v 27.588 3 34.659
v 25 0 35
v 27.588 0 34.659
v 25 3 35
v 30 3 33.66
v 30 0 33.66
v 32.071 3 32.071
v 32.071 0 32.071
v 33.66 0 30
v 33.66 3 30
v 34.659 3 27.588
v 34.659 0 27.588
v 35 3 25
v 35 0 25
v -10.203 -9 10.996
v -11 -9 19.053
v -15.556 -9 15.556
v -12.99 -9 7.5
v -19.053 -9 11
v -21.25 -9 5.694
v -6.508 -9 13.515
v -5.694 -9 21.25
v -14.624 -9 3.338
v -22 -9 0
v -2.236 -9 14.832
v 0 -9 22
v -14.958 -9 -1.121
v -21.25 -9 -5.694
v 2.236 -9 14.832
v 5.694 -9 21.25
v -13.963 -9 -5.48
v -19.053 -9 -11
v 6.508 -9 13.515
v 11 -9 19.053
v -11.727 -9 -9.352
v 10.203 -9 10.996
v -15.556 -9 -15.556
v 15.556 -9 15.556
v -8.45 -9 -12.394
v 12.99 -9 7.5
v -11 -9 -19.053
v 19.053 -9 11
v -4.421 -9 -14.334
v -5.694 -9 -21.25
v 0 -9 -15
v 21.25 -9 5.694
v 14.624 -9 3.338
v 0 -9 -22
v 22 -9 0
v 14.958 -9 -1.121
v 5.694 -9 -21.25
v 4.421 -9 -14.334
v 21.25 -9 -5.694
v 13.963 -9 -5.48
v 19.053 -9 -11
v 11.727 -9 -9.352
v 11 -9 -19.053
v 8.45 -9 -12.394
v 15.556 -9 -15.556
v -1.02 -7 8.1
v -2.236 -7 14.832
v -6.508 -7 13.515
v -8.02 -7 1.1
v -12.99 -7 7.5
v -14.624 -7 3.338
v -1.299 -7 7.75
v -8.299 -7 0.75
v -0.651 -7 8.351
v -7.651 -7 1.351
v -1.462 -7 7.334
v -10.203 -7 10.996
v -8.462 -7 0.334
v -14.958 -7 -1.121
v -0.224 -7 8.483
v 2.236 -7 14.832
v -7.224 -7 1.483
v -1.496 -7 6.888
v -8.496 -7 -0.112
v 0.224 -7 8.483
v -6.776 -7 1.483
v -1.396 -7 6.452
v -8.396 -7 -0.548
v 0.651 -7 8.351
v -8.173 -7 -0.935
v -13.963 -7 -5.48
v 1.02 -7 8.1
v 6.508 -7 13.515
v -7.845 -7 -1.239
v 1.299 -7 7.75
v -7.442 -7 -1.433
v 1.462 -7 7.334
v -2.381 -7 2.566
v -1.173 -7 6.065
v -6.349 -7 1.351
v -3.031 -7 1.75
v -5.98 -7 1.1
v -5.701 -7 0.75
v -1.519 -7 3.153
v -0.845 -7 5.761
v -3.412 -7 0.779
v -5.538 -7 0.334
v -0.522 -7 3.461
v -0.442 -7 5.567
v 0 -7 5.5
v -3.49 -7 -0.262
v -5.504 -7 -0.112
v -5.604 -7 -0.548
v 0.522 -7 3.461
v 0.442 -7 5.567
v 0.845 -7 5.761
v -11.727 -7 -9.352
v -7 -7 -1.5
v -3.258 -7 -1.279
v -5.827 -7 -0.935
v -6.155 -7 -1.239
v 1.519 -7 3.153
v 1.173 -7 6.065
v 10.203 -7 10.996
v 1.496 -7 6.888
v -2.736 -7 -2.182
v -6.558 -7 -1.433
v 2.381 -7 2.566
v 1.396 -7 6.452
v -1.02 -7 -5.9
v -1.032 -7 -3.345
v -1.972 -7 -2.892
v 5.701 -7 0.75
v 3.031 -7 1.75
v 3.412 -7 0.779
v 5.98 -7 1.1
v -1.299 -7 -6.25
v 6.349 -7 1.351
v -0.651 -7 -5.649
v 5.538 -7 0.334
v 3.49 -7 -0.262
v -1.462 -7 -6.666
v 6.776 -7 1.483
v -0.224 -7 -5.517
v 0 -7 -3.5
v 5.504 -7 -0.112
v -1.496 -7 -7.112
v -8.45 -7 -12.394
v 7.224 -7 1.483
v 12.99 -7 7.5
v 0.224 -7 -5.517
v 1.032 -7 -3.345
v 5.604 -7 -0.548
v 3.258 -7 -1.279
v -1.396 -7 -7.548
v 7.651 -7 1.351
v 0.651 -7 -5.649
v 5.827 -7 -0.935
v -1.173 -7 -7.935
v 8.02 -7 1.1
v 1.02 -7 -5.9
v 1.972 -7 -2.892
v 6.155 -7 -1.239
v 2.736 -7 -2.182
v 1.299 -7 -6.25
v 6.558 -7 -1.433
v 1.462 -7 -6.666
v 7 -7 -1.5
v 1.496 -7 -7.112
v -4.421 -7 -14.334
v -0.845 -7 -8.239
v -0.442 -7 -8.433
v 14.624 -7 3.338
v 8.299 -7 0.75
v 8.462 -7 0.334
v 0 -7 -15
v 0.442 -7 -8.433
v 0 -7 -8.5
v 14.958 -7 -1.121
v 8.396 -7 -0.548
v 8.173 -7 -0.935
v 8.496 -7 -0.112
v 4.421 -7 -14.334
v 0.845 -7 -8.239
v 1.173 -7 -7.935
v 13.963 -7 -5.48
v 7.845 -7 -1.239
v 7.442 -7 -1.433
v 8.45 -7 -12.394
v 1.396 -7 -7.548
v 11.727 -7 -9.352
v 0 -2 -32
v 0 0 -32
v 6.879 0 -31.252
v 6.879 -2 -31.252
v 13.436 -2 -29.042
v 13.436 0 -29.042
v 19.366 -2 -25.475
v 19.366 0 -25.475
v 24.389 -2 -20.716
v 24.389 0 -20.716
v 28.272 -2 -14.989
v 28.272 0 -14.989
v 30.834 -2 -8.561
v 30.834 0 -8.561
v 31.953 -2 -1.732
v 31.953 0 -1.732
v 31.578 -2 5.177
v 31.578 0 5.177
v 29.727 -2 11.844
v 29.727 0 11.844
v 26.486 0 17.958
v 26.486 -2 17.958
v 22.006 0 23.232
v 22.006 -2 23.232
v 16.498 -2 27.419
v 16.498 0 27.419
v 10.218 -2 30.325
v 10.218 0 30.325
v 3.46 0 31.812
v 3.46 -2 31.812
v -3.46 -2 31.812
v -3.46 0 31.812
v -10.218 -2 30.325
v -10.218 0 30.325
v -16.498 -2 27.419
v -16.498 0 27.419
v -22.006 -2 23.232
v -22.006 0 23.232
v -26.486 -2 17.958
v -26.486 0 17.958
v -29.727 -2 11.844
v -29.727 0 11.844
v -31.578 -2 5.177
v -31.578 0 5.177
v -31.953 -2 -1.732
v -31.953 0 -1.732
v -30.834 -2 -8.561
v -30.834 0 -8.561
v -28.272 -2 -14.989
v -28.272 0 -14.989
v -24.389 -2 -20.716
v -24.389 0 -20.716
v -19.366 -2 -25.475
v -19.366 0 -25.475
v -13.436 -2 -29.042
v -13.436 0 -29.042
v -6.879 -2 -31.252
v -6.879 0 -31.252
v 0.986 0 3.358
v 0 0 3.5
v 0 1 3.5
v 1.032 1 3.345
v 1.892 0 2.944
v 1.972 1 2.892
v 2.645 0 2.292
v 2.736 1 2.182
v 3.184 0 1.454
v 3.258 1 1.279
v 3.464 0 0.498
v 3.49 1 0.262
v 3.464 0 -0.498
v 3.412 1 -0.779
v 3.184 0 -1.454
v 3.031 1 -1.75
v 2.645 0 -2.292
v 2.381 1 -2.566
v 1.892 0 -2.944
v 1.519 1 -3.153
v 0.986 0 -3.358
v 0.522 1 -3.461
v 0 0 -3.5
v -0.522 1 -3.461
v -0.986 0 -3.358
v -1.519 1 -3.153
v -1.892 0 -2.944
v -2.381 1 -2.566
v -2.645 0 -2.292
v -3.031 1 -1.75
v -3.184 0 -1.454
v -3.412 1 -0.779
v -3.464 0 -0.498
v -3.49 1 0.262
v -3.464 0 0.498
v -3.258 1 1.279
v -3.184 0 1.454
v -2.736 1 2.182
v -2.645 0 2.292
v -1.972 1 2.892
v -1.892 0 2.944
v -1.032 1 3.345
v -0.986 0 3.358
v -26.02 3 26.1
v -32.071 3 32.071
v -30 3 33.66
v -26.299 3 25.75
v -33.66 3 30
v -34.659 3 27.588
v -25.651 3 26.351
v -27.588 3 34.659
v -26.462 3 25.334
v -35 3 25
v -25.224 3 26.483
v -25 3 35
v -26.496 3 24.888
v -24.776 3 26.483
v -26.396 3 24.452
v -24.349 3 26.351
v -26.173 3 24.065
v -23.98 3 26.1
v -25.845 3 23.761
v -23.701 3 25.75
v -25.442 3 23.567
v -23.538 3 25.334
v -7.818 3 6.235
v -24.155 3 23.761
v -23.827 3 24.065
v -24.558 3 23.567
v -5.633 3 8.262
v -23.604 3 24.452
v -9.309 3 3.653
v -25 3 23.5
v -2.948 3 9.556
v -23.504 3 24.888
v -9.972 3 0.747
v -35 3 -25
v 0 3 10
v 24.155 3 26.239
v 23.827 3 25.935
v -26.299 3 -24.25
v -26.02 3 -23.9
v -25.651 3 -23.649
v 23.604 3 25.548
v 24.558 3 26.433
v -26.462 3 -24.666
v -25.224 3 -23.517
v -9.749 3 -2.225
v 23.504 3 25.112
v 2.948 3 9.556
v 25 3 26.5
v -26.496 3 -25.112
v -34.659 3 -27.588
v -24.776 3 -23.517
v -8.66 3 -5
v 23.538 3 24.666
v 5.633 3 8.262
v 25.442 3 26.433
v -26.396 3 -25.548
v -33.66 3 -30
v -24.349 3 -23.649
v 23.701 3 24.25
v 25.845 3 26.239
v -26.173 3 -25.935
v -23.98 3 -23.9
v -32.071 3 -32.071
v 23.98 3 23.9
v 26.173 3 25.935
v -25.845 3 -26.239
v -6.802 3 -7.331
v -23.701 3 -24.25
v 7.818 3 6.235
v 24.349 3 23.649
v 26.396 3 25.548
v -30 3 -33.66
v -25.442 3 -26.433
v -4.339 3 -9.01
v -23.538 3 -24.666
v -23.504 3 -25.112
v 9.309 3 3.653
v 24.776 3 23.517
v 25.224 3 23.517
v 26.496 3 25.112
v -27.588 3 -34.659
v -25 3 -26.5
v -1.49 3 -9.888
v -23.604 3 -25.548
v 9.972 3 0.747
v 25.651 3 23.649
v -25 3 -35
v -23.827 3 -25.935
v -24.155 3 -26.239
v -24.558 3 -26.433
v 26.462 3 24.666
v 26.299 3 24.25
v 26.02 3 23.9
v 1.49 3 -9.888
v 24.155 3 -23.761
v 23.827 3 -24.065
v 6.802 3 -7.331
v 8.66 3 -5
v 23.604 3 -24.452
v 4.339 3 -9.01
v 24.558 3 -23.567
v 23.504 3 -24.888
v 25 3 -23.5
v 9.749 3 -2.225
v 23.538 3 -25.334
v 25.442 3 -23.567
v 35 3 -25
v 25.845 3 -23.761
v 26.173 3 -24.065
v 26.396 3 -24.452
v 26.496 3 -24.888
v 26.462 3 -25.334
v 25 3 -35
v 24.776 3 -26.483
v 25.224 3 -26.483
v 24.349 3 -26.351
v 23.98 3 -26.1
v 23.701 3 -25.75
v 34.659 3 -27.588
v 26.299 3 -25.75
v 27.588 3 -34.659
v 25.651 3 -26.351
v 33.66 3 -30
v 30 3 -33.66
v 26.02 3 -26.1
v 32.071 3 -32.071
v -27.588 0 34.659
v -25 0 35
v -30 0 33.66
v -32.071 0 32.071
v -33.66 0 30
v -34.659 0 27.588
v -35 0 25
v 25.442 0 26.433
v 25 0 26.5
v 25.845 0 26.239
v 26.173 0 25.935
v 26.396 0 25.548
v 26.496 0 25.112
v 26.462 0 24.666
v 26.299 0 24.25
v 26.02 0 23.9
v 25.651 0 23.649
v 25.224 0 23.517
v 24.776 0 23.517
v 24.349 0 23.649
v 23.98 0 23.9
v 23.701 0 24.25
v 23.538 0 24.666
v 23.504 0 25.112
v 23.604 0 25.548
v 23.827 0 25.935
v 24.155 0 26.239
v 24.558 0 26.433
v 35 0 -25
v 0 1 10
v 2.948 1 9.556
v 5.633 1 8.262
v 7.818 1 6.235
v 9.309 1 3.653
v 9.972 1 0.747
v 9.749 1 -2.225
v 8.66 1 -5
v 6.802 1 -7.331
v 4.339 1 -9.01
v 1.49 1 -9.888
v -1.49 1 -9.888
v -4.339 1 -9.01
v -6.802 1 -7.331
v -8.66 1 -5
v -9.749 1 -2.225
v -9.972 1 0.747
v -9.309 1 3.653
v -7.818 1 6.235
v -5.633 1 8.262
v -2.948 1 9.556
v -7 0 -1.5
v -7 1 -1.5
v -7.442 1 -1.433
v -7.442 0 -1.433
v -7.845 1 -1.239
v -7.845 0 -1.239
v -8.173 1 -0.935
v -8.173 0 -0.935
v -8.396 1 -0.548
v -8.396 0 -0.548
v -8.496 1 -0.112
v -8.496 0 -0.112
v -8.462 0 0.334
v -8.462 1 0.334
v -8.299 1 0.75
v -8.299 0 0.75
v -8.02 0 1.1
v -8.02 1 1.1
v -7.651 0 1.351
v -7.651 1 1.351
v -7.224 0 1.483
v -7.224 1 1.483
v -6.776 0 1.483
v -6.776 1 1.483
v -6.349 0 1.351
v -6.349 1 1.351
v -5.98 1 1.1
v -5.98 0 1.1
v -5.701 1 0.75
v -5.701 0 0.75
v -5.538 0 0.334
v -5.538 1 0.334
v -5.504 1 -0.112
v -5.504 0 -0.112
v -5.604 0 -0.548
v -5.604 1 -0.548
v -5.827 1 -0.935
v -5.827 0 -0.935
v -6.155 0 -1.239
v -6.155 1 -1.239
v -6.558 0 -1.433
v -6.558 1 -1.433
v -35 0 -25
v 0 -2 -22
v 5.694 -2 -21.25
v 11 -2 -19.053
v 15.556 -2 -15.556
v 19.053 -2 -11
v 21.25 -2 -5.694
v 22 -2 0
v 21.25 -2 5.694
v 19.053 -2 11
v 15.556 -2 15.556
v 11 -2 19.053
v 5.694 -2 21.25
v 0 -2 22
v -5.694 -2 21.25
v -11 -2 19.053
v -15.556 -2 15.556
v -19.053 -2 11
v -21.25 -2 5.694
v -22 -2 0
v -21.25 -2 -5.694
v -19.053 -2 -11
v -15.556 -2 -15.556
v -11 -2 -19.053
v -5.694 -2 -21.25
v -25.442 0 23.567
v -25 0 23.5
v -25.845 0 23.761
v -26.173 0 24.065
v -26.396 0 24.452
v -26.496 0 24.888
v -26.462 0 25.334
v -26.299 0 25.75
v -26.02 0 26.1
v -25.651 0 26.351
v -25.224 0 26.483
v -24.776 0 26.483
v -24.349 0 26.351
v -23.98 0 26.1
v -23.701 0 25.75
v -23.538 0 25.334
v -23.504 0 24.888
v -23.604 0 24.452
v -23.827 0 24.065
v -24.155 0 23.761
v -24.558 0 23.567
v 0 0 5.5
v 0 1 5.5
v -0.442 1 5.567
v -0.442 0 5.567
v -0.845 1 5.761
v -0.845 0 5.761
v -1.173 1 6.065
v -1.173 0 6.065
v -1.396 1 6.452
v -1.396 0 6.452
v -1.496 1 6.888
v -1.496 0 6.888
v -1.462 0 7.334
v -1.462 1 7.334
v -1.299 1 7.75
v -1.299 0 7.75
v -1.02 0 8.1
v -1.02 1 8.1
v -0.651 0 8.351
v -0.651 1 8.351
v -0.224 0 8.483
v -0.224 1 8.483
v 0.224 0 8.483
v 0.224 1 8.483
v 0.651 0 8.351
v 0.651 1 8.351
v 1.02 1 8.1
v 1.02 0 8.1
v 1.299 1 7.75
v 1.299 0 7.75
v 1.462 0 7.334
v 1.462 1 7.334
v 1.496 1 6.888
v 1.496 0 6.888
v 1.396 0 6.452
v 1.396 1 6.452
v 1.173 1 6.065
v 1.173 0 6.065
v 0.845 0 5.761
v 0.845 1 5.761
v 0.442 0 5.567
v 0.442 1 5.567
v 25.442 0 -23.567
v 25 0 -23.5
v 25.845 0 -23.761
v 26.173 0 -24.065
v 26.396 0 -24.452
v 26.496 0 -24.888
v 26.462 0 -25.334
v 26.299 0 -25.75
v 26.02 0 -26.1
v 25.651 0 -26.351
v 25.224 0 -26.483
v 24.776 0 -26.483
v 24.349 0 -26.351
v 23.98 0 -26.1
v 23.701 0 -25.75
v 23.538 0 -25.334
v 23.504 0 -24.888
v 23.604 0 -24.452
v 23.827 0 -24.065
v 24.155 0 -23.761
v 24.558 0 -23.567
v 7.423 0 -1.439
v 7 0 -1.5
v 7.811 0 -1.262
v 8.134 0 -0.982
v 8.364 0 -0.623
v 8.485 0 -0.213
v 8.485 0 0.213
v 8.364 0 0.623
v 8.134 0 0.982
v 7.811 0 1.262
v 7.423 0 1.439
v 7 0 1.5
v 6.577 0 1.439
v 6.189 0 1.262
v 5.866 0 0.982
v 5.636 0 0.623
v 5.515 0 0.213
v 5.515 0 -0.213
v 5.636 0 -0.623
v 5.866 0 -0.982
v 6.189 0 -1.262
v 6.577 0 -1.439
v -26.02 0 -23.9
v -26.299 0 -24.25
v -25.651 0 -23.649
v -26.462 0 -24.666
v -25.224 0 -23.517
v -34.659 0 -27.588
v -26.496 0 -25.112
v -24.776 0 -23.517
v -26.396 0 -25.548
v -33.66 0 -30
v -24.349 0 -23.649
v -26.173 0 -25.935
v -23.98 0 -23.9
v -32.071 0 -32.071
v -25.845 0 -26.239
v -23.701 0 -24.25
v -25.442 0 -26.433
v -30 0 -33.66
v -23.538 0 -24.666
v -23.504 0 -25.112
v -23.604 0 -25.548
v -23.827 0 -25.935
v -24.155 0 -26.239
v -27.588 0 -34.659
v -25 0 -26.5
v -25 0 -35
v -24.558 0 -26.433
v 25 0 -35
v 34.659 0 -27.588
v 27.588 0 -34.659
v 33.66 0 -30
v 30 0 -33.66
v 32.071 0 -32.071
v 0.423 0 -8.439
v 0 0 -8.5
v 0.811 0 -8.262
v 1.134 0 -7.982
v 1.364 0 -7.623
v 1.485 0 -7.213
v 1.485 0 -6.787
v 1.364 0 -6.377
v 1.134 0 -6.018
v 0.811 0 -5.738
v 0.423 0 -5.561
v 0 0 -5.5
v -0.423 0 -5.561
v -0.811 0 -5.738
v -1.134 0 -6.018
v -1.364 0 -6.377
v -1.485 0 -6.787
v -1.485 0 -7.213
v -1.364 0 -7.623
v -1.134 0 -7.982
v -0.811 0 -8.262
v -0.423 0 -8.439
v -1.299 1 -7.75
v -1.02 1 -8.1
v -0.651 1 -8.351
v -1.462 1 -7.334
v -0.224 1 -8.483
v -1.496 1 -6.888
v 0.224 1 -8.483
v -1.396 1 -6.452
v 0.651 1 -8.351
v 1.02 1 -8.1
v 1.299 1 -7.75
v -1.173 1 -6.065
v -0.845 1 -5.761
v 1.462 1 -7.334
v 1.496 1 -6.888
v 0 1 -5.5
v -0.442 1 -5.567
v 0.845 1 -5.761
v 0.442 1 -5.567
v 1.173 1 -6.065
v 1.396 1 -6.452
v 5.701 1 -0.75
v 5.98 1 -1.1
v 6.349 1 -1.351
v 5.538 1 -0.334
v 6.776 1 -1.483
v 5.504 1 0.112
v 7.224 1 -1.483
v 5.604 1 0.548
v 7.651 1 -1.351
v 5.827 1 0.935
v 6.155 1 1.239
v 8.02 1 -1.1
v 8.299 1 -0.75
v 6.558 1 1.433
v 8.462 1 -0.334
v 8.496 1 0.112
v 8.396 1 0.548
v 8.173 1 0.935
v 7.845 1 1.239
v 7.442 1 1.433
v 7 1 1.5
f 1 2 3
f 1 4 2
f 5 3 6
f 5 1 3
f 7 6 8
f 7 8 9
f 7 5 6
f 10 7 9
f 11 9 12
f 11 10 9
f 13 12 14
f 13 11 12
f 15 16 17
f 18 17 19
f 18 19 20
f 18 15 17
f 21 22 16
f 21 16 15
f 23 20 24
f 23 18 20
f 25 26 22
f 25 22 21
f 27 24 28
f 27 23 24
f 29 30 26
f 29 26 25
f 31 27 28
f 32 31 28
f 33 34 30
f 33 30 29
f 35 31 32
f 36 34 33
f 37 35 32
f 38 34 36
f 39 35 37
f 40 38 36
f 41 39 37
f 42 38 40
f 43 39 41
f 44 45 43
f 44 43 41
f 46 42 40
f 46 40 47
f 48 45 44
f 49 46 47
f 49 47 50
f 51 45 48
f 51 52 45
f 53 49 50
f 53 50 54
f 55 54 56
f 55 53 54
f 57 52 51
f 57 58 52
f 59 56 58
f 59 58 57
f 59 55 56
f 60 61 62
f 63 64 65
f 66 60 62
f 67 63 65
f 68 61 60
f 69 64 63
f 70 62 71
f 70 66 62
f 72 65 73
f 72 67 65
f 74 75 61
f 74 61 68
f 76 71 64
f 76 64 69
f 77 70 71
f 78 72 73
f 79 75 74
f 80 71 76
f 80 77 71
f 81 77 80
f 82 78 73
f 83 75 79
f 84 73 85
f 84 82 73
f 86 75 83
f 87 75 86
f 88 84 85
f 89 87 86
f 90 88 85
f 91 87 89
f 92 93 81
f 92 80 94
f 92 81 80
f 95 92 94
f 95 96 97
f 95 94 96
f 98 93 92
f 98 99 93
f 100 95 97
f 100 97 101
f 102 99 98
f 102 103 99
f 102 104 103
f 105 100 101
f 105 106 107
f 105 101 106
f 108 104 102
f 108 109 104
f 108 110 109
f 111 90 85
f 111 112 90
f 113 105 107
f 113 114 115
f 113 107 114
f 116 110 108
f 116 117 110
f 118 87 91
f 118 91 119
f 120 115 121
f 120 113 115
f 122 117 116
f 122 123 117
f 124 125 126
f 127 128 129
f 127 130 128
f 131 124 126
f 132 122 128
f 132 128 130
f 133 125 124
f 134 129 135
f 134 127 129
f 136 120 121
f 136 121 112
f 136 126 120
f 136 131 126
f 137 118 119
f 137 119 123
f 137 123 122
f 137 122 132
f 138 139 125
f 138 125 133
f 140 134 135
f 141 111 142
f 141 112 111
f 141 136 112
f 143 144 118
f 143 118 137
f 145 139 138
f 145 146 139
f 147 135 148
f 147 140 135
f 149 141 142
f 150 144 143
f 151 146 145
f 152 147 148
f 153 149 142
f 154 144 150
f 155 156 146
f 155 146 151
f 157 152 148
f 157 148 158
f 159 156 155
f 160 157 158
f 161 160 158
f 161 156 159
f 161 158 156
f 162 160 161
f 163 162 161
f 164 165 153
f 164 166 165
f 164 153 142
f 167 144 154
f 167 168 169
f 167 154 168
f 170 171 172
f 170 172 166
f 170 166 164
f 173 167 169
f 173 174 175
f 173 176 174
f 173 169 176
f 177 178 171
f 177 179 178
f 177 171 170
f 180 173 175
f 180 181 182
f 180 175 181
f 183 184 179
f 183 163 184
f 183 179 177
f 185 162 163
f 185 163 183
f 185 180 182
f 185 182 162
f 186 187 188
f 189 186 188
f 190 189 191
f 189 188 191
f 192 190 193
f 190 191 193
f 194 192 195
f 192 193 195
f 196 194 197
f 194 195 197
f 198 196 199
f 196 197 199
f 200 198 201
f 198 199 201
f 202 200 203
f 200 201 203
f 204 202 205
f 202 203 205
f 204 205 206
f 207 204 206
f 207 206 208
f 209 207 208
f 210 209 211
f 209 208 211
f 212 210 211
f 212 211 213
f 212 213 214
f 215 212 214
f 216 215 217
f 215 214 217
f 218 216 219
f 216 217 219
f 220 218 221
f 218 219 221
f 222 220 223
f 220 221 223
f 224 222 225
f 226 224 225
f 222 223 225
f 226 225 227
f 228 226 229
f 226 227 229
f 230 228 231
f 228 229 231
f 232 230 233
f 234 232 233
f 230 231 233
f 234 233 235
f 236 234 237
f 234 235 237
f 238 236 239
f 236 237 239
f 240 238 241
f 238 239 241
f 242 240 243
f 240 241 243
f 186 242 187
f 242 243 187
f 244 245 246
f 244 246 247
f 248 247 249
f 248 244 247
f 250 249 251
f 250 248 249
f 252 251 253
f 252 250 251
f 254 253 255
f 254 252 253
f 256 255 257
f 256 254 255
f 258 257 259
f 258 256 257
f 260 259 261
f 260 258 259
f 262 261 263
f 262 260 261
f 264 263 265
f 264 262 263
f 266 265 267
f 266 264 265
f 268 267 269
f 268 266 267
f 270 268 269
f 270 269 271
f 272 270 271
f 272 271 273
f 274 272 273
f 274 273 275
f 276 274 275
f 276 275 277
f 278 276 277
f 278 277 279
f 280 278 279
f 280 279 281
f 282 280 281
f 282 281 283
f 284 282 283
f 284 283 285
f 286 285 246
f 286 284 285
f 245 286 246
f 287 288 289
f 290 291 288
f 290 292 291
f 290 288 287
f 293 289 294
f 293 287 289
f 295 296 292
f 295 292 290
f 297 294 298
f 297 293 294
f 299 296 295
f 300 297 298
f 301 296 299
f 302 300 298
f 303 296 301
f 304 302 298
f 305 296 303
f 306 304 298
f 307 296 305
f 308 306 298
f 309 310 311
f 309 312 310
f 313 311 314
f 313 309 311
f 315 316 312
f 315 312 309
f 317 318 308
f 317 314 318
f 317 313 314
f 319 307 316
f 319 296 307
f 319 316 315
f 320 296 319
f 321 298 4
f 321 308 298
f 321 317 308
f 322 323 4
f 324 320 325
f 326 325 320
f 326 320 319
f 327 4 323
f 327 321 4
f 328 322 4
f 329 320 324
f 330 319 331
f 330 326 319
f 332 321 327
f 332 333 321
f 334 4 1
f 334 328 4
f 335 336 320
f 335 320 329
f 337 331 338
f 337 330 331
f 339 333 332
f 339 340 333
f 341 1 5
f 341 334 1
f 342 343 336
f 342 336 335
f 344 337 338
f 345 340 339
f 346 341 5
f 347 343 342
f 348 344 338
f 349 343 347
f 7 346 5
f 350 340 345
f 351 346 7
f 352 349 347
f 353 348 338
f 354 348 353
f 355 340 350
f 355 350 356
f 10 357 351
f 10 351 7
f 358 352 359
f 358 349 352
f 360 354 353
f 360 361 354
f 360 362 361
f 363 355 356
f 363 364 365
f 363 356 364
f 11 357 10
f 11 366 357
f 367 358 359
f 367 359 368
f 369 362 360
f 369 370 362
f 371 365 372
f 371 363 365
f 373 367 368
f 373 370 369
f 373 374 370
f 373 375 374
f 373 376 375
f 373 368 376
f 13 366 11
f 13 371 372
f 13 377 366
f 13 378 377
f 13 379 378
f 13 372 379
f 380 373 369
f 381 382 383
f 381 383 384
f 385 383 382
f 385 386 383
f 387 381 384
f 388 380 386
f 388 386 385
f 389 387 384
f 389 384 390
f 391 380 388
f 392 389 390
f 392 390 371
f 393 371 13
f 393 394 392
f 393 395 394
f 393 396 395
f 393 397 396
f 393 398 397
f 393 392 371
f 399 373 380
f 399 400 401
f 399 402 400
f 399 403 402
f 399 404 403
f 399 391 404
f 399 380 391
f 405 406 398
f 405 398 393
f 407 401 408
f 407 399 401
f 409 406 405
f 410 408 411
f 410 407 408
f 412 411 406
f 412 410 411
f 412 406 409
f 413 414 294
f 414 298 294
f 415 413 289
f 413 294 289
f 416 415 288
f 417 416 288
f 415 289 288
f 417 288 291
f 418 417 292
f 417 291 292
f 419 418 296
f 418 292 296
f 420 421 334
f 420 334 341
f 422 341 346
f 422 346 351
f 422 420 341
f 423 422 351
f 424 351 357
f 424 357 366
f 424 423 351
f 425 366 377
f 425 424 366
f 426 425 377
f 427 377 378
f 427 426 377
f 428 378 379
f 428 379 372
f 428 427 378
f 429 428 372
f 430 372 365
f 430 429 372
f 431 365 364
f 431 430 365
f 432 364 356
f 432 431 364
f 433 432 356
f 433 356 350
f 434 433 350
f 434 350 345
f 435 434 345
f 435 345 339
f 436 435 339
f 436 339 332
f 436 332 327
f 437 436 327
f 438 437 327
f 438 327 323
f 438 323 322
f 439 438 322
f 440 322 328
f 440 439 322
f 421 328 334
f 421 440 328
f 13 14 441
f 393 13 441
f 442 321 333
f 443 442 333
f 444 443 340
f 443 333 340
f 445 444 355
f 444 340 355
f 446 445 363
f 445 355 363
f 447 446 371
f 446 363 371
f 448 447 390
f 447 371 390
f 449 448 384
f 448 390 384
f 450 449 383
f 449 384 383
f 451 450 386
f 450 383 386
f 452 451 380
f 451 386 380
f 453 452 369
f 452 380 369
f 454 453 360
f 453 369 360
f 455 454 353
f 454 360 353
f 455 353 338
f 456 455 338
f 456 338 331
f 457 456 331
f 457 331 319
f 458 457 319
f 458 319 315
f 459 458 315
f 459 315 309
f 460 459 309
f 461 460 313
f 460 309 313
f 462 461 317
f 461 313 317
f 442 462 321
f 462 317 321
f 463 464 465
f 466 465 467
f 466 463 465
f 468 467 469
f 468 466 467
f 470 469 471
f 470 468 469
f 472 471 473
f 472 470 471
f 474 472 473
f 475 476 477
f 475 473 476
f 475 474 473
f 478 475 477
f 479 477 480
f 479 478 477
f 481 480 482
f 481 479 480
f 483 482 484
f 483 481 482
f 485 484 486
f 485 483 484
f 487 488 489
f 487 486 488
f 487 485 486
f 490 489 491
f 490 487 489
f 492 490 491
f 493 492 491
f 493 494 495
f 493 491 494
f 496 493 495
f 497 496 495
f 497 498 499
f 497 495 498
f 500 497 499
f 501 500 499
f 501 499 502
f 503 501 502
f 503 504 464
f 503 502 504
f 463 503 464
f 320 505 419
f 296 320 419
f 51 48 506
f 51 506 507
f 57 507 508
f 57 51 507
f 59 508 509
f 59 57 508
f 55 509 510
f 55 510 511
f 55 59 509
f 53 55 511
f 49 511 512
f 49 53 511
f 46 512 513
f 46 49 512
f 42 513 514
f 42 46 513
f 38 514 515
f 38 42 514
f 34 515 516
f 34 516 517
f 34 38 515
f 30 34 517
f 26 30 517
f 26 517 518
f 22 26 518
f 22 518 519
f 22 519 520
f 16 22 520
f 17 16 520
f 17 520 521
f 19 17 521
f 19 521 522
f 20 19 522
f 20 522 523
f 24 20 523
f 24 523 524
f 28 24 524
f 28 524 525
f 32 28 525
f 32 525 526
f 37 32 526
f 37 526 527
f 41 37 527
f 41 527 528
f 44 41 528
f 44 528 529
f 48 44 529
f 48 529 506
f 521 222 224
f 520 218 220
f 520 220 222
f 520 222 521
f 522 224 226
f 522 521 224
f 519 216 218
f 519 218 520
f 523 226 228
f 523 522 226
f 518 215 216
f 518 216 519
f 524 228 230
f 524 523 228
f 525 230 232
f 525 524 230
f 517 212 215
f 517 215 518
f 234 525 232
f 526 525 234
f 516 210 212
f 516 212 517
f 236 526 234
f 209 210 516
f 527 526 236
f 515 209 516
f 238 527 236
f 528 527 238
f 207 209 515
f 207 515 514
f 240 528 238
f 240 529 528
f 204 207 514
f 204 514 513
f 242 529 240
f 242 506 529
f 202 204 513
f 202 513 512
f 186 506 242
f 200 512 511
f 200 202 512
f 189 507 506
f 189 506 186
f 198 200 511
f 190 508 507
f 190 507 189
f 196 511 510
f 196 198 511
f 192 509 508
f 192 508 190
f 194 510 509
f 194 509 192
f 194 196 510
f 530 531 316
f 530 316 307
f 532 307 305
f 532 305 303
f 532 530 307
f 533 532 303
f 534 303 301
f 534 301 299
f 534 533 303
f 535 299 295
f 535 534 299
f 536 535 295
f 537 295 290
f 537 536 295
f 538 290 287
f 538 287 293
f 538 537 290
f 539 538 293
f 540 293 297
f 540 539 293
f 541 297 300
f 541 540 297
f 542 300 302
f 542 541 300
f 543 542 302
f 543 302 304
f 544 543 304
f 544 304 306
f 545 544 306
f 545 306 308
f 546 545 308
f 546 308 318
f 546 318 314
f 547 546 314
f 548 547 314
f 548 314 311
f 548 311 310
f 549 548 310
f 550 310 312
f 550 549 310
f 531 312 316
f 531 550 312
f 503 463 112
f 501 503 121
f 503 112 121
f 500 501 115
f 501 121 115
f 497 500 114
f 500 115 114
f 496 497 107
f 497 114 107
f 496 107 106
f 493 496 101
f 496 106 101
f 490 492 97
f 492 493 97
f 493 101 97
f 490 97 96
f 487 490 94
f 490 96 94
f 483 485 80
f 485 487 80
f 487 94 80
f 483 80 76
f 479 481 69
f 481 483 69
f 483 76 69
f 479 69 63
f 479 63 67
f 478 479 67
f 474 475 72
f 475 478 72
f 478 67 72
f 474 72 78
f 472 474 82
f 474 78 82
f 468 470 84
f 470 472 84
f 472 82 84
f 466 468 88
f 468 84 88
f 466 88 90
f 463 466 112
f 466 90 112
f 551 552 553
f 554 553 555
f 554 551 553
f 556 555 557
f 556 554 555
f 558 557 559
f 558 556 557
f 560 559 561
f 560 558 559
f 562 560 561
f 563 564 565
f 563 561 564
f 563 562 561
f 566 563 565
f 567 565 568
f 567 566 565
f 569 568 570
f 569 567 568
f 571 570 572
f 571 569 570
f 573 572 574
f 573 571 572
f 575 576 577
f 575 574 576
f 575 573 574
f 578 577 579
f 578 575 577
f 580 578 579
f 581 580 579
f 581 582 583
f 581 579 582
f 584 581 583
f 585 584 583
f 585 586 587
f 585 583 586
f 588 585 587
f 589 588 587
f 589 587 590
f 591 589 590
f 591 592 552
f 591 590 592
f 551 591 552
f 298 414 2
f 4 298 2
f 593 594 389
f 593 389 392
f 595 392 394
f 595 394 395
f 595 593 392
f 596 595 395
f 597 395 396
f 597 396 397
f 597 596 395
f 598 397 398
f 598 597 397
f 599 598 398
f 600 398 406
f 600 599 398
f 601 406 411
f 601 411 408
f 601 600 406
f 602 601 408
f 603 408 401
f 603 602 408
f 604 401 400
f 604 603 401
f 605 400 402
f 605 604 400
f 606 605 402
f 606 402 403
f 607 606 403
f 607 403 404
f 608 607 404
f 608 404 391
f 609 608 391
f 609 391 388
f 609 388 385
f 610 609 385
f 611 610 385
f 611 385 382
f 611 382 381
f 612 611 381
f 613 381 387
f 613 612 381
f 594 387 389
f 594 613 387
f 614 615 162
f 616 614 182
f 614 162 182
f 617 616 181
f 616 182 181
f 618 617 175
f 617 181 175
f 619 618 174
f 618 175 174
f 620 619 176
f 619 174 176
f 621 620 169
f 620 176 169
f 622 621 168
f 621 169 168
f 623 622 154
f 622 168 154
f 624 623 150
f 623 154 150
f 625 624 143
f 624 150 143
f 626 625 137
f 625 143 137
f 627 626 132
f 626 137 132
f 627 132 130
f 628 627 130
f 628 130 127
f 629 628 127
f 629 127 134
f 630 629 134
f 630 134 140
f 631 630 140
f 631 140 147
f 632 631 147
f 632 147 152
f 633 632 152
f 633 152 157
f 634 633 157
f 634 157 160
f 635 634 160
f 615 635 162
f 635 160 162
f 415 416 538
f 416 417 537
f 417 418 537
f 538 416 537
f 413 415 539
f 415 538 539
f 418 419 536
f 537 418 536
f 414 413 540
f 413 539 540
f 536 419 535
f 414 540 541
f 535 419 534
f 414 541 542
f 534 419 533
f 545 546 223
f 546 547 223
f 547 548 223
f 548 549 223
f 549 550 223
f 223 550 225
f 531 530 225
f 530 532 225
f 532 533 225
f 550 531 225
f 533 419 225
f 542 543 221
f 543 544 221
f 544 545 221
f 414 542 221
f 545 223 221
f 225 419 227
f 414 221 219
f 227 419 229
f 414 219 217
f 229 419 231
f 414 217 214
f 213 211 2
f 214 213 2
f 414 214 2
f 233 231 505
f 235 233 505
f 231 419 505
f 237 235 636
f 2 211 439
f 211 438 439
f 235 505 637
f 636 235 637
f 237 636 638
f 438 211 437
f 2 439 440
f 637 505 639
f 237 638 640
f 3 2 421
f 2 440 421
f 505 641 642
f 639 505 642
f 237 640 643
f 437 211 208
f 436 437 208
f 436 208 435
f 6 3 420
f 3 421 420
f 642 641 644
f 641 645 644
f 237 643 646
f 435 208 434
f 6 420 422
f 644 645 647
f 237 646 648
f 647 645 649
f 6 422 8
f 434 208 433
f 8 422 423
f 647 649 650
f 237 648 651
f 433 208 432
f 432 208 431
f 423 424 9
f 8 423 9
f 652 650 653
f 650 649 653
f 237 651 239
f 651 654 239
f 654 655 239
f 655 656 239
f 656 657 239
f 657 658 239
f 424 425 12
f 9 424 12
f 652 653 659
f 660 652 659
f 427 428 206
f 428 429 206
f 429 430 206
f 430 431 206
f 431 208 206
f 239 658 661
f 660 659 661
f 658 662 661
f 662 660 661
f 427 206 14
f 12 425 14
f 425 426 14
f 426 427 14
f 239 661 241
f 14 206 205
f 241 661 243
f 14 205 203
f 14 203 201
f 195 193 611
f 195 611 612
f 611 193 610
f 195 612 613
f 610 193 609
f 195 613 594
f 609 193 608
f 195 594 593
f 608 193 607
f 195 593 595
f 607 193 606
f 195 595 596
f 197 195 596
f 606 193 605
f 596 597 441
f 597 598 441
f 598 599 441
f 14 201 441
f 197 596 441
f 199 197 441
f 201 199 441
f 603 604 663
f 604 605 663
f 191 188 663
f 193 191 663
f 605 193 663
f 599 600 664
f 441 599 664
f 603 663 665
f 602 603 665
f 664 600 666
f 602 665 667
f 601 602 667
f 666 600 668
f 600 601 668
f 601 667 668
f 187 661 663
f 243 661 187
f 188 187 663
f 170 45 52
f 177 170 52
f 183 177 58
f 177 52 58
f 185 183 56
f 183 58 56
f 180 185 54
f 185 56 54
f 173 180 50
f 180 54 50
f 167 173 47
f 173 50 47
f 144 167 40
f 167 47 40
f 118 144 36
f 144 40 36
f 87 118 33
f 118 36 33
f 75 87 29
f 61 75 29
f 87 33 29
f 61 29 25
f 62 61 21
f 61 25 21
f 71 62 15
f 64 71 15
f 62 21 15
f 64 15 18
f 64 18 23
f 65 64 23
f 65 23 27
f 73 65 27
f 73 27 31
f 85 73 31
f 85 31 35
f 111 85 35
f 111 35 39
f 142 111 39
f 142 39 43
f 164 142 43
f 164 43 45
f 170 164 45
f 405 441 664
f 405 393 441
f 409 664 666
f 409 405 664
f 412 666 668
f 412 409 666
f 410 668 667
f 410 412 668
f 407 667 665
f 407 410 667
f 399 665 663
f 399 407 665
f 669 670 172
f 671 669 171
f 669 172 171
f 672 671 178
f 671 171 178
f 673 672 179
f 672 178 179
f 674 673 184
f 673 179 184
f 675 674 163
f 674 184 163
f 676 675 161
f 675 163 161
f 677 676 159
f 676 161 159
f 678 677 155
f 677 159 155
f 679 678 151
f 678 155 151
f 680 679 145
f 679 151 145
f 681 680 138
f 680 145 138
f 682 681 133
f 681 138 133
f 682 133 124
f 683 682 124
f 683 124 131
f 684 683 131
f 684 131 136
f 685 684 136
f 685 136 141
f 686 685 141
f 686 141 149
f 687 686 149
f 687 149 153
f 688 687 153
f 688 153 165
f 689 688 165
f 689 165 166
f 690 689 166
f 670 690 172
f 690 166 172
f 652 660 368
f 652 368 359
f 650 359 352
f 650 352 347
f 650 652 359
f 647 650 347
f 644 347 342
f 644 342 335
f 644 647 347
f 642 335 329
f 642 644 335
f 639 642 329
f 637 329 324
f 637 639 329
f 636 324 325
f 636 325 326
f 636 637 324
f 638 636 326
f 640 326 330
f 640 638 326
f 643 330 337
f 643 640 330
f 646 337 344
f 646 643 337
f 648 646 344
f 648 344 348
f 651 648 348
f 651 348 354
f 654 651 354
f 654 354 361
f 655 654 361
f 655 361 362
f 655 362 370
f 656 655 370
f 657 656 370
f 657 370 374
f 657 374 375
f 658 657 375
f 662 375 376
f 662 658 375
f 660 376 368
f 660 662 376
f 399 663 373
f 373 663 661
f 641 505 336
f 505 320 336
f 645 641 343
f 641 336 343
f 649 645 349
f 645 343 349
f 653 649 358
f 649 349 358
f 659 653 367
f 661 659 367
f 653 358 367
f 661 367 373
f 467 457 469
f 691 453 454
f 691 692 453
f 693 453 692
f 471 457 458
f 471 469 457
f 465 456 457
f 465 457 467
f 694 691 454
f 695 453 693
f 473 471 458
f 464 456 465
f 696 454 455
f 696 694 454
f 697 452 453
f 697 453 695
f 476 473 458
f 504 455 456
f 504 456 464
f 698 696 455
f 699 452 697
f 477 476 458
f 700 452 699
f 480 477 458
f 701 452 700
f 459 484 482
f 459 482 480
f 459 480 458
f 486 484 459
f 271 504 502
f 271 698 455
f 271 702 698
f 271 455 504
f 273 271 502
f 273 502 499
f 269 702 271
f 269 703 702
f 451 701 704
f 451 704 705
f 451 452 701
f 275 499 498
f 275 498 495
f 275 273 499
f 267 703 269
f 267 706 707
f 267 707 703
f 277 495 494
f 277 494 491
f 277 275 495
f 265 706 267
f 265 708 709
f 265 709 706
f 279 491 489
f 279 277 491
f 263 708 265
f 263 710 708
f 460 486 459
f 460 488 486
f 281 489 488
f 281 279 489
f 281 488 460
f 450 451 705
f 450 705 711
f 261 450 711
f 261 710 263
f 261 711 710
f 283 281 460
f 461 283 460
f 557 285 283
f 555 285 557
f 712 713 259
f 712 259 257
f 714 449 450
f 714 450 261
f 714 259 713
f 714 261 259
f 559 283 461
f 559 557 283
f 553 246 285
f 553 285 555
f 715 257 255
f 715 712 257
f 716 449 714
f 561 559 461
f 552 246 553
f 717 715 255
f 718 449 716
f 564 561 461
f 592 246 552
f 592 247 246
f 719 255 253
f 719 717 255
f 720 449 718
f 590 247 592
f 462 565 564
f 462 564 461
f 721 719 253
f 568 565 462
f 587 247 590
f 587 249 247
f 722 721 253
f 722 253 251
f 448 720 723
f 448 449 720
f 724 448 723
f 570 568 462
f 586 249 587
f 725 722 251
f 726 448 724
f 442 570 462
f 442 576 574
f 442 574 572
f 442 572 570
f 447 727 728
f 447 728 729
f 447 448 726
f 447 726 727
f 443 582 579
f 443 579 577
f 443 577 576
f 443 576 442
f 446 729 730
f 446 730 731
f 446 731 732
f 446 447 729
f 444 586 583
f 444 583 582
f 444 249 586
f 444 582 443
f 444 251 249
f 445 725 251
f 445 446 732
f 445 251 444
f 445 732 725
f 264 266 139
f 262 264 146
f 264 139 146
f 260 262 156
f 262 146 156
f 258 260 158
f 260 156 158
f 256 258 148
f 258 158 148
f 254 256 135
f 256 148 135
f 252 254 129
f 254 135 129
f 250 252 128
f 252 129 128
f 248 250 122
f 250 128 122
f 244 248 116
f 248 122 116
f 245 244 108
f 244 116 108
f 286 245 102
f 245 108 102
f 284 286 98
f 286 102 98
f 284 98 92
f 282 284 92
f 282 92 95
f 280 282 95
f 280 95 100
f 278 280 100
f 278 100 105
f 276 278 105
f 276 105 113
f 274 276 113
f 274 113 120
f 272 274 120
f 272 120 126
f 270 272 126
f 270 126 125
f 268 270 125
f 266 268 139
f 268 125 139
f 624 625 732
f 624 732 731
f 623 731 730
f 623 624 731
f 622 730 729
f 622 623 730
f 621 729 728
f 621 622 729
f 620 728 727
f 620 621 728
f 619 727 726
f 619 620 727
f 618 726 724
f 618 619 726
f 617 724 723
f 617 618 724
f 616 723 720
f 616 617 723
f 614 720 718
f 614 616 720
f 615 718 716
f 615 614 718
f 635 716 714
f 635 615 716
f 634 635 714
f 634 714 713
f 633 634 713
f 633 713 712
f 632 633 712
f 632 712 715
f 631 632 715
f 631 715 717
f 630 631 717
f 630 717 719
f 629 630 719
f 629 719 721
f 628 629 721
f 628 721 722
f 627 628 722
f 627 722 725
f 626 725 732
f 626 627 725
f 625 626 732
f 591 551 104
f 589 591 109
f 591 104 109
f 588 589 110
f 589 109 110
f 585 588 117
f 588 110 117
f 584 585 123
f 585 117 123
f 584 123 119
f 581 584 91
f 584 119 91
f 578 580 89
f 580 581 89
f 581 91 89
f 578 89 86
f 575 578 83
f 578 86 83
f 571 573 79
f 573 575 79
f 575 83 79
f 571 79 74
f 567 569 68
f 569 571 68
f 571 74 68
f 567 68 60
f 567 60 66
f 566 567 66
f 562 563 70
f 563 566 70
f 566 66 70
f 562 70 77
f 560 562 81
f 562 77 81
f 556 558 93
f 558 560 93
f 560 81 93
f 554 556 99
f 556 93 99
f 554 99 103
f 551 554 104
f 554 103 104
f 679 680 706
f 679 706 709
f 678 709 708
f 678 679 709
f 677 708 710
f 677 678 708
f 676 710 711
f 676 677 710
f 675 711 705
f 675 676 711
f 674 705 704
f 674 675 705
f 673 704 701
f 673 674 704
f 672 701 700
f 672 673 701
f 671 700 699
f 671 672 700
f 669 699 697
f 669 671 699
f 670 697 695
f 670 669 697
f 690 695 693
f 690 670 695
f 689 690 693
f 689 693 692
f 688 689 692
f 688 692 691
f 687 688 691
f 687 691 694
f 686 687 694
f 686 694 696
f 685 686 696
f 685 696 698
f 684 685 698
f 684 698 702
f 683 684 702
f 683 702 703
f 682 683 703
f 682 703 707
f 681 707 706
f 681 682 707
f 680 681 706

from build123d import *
from build123d.topology import SkipClean

# Parameters (mm, degrees)
SKETCH_1_R          = 1.5000000000000002
SKETCH_1_R_2        = 1.5000000000000007
SKETCH_1_R_3        = 3.5000000000000036
SKETCH_1_R_4        = 1.5000000000000004
SKETCH_1_R_5        = 1.5000000000000009
EXTRUDE_1_DEPTH     = 3
EXTRUDE_START       = 7
SKETCH_2_R          = 15.00000000000001
SKETCH_2_R_2        = 1.5000000000000002
SKETCH_2_R_3        = 3.5000000000000036
SKETCH_2_R_4        = 1.5000000000000009
SKETCH_2_R_5        = 1.5000000000000007
EXTRUDE_2_DEPTH     = 7
EXTRUDE_START_2     = 9
SKETCH_6_R          = 22
SKETCH_6_R_2        = 15
EXTRUDE_3_DEPTH     = 9
SKETCH_8_R          = 32
SKETCH_8_R_2        = 12.000000000000002
EXTRUDE_5_DEPTH     = 2
FILLET_1_R          = 10
SKETCH_11_R         = 10
CUT_EXTRUDE_1_DEPTH = 2


with BuildPart() as part:
    # 草图1 → 凸台-拉伸1 (new body)
    with BuildSketch(Plane(origin=(0, 0, 0), x_dir=(1, 0, 0), z_dir=(0, 1, 0))):
        Polygon((-35.00000000000001, -35), (34.99999999999999, -35), (34.99999999999999, 34.99999999999999), (-35.00000000000001, 35), align=None)
        with Locations(Location((4.3e-16, 6.999999999999999, 0), (0, 0, 270))):
            Circle(SKETCH_1_R, mode=Mode.SUBTRACT)
        with Locations(Location((6.999999999999999, -4.3e-16, 0), (0, 0, 270))):
            Circle(SKETCH_1_R_2, mode=Mode.SUBTRACT)
        with Locations(Location((-4.21e-15, 2.73e-15, 0), (0, 0, 270))):
            Circle(SKETCH_1_R_3, mode=Mode.SUBTRACT)
        with Locations(Location((-9.8e-16, -6.999999999999999, 0), (0, 0, 90))):
            Circle(SKETCH_1_R_4, mode=Mode.SUBTRACT)
        with Locations(Location((-6.999999999999999, 1.89e-15, 0), (0, 0, 90))):
            Circle(SKETCH_1_R_2, mode=Mode.SUBTRACT)
        with Locations(Location((25, 25, 0), (0, 0, 270))):
            Circle(SKETCH_1_R_5, mode=Mode.SUBTRACT)
        with Locations(Location((-25, 25, 0), (0, 0, 90))):
            Circle(SKETCH_1_R_5, mode=Mode.SUBTRACT)
        with Locations(Location((25, -25, 0), (0, 0, 270))):
            Circle(SKETCH_1_R_5, mode=Mode.SUBTRACT)
        with Locations(Location((-25, -25, 0), (0, 0, 90))):
            Circle(SKETCH_1_R_5, mode=Mode.SUBTRACT)
    extrude(amount=EXTRUDE_1_DEPTH)

    # 草图2 → 凸台-拉伸2 (add)
    with SkipClean():  # the faces are left unmerged after this step: merging them gives an invalid solid
        with BuildSketch(Plane.XZ.offset(EXTRUDE_START)):
            with Locations(Location((-4.21e-15, -2.73e-15, 0), (0, 0, 270))):
                Circle(SKETCH_2_R)
            with Locations(Location((-9.8e-16, 6.999999999999999, 0), (0, 0, 270))):
                Circle(SKETCH_2_R_2, mode=Mode.SUBTRACT)
            with Locations(Location((-4.21e-15, -2.73e-15, 0), (0, 0, 270))):
                Circle(SKETCH_2_R_3, mode=Mode.SUBTRACT)
            with Locations(Location((-6.999999999999999, -1.89e-15, 0), (0, 0, 270))):
                Circle(SKETCH_2_R_4, mode=Mode.SUBTRACT)
            with Locations(Location((4.3e-16, -6.999999999999999, 0), (0, 0, 270))):
                Circle(SKETCH_2_R_2, mode=Mode.SUBTRACT)
            with Locations(Location((6.999999999999999, 4.3e-16, 0), (0, 0, 270))):
                Circle(SKETCH_2_R_5, mode=Mode.SUBTRACT)
        extrude(amount=-EXTRUDE_2_DEPTH)

    # 草图6 → 凸台-拉伸3 (add)
    with SkipClean():  # the faces are left unmerged after this step: merging them gives an invalid solid
        with BuildSketch(Plane.XZ.offset(EXTRUDE_START_2)):
            with Locations(Location((0, 0, 0), (0, 0, 270))):
                Circle(SKETCH_6_R)
            with Locations(Location((0, 0, 0), (0, 0, 270))):
                Circle(SKETCH_6_R_2, mode=Mode.SUBTRACT)
        extrude(amount=-EXTRUDE_3_DEPTH)

    # 草图8 → 凸台-拉伸5 (add)
    with SkipClean():  # the faces are left unmerged after this step: merging them gives an invalid solid
        with BuildSketch(Plane.XZ):
            with Locations(Location((0, 0, 0), (0, 0, 270))):
                Circle(SKETCH_8_R)
            Circle(SKETCH_8_R_2, mode=Mode.SUBTRACT)
        extrude(amount=EXTRUDE_5_DEPTH)

    # 圆角1
    fillet_1_edges = [part.edges().sort_by_distance(p)[0] for p in [
        (34.99999999999999, 1.5, 35),
        (-35.00000000000001, 1.5, 35),
        (-35.00000000000001, 1.5, -35),
        (34.99999999999999, 1.5, -34.99999999999999),
    ]]
    fillet(fillet_1_edges, radius=FILLET_1_R)

    # 草图11 → 切除-拉伸1 (cut)
    with BuildSketch(Plane(origin=(0, 3, 0), x_dir=(1, 0, 0), z_dir=(0, 1, 0))):
        with Locations(Location((0, 0, 0), (0, 0, 270))):
            Circle(SKETCH_11_R)
    extrude(amount=-CUT_EXTRUDE_1_DEPTH, mode=Mode.SUBTRACT)


solid = part.part
